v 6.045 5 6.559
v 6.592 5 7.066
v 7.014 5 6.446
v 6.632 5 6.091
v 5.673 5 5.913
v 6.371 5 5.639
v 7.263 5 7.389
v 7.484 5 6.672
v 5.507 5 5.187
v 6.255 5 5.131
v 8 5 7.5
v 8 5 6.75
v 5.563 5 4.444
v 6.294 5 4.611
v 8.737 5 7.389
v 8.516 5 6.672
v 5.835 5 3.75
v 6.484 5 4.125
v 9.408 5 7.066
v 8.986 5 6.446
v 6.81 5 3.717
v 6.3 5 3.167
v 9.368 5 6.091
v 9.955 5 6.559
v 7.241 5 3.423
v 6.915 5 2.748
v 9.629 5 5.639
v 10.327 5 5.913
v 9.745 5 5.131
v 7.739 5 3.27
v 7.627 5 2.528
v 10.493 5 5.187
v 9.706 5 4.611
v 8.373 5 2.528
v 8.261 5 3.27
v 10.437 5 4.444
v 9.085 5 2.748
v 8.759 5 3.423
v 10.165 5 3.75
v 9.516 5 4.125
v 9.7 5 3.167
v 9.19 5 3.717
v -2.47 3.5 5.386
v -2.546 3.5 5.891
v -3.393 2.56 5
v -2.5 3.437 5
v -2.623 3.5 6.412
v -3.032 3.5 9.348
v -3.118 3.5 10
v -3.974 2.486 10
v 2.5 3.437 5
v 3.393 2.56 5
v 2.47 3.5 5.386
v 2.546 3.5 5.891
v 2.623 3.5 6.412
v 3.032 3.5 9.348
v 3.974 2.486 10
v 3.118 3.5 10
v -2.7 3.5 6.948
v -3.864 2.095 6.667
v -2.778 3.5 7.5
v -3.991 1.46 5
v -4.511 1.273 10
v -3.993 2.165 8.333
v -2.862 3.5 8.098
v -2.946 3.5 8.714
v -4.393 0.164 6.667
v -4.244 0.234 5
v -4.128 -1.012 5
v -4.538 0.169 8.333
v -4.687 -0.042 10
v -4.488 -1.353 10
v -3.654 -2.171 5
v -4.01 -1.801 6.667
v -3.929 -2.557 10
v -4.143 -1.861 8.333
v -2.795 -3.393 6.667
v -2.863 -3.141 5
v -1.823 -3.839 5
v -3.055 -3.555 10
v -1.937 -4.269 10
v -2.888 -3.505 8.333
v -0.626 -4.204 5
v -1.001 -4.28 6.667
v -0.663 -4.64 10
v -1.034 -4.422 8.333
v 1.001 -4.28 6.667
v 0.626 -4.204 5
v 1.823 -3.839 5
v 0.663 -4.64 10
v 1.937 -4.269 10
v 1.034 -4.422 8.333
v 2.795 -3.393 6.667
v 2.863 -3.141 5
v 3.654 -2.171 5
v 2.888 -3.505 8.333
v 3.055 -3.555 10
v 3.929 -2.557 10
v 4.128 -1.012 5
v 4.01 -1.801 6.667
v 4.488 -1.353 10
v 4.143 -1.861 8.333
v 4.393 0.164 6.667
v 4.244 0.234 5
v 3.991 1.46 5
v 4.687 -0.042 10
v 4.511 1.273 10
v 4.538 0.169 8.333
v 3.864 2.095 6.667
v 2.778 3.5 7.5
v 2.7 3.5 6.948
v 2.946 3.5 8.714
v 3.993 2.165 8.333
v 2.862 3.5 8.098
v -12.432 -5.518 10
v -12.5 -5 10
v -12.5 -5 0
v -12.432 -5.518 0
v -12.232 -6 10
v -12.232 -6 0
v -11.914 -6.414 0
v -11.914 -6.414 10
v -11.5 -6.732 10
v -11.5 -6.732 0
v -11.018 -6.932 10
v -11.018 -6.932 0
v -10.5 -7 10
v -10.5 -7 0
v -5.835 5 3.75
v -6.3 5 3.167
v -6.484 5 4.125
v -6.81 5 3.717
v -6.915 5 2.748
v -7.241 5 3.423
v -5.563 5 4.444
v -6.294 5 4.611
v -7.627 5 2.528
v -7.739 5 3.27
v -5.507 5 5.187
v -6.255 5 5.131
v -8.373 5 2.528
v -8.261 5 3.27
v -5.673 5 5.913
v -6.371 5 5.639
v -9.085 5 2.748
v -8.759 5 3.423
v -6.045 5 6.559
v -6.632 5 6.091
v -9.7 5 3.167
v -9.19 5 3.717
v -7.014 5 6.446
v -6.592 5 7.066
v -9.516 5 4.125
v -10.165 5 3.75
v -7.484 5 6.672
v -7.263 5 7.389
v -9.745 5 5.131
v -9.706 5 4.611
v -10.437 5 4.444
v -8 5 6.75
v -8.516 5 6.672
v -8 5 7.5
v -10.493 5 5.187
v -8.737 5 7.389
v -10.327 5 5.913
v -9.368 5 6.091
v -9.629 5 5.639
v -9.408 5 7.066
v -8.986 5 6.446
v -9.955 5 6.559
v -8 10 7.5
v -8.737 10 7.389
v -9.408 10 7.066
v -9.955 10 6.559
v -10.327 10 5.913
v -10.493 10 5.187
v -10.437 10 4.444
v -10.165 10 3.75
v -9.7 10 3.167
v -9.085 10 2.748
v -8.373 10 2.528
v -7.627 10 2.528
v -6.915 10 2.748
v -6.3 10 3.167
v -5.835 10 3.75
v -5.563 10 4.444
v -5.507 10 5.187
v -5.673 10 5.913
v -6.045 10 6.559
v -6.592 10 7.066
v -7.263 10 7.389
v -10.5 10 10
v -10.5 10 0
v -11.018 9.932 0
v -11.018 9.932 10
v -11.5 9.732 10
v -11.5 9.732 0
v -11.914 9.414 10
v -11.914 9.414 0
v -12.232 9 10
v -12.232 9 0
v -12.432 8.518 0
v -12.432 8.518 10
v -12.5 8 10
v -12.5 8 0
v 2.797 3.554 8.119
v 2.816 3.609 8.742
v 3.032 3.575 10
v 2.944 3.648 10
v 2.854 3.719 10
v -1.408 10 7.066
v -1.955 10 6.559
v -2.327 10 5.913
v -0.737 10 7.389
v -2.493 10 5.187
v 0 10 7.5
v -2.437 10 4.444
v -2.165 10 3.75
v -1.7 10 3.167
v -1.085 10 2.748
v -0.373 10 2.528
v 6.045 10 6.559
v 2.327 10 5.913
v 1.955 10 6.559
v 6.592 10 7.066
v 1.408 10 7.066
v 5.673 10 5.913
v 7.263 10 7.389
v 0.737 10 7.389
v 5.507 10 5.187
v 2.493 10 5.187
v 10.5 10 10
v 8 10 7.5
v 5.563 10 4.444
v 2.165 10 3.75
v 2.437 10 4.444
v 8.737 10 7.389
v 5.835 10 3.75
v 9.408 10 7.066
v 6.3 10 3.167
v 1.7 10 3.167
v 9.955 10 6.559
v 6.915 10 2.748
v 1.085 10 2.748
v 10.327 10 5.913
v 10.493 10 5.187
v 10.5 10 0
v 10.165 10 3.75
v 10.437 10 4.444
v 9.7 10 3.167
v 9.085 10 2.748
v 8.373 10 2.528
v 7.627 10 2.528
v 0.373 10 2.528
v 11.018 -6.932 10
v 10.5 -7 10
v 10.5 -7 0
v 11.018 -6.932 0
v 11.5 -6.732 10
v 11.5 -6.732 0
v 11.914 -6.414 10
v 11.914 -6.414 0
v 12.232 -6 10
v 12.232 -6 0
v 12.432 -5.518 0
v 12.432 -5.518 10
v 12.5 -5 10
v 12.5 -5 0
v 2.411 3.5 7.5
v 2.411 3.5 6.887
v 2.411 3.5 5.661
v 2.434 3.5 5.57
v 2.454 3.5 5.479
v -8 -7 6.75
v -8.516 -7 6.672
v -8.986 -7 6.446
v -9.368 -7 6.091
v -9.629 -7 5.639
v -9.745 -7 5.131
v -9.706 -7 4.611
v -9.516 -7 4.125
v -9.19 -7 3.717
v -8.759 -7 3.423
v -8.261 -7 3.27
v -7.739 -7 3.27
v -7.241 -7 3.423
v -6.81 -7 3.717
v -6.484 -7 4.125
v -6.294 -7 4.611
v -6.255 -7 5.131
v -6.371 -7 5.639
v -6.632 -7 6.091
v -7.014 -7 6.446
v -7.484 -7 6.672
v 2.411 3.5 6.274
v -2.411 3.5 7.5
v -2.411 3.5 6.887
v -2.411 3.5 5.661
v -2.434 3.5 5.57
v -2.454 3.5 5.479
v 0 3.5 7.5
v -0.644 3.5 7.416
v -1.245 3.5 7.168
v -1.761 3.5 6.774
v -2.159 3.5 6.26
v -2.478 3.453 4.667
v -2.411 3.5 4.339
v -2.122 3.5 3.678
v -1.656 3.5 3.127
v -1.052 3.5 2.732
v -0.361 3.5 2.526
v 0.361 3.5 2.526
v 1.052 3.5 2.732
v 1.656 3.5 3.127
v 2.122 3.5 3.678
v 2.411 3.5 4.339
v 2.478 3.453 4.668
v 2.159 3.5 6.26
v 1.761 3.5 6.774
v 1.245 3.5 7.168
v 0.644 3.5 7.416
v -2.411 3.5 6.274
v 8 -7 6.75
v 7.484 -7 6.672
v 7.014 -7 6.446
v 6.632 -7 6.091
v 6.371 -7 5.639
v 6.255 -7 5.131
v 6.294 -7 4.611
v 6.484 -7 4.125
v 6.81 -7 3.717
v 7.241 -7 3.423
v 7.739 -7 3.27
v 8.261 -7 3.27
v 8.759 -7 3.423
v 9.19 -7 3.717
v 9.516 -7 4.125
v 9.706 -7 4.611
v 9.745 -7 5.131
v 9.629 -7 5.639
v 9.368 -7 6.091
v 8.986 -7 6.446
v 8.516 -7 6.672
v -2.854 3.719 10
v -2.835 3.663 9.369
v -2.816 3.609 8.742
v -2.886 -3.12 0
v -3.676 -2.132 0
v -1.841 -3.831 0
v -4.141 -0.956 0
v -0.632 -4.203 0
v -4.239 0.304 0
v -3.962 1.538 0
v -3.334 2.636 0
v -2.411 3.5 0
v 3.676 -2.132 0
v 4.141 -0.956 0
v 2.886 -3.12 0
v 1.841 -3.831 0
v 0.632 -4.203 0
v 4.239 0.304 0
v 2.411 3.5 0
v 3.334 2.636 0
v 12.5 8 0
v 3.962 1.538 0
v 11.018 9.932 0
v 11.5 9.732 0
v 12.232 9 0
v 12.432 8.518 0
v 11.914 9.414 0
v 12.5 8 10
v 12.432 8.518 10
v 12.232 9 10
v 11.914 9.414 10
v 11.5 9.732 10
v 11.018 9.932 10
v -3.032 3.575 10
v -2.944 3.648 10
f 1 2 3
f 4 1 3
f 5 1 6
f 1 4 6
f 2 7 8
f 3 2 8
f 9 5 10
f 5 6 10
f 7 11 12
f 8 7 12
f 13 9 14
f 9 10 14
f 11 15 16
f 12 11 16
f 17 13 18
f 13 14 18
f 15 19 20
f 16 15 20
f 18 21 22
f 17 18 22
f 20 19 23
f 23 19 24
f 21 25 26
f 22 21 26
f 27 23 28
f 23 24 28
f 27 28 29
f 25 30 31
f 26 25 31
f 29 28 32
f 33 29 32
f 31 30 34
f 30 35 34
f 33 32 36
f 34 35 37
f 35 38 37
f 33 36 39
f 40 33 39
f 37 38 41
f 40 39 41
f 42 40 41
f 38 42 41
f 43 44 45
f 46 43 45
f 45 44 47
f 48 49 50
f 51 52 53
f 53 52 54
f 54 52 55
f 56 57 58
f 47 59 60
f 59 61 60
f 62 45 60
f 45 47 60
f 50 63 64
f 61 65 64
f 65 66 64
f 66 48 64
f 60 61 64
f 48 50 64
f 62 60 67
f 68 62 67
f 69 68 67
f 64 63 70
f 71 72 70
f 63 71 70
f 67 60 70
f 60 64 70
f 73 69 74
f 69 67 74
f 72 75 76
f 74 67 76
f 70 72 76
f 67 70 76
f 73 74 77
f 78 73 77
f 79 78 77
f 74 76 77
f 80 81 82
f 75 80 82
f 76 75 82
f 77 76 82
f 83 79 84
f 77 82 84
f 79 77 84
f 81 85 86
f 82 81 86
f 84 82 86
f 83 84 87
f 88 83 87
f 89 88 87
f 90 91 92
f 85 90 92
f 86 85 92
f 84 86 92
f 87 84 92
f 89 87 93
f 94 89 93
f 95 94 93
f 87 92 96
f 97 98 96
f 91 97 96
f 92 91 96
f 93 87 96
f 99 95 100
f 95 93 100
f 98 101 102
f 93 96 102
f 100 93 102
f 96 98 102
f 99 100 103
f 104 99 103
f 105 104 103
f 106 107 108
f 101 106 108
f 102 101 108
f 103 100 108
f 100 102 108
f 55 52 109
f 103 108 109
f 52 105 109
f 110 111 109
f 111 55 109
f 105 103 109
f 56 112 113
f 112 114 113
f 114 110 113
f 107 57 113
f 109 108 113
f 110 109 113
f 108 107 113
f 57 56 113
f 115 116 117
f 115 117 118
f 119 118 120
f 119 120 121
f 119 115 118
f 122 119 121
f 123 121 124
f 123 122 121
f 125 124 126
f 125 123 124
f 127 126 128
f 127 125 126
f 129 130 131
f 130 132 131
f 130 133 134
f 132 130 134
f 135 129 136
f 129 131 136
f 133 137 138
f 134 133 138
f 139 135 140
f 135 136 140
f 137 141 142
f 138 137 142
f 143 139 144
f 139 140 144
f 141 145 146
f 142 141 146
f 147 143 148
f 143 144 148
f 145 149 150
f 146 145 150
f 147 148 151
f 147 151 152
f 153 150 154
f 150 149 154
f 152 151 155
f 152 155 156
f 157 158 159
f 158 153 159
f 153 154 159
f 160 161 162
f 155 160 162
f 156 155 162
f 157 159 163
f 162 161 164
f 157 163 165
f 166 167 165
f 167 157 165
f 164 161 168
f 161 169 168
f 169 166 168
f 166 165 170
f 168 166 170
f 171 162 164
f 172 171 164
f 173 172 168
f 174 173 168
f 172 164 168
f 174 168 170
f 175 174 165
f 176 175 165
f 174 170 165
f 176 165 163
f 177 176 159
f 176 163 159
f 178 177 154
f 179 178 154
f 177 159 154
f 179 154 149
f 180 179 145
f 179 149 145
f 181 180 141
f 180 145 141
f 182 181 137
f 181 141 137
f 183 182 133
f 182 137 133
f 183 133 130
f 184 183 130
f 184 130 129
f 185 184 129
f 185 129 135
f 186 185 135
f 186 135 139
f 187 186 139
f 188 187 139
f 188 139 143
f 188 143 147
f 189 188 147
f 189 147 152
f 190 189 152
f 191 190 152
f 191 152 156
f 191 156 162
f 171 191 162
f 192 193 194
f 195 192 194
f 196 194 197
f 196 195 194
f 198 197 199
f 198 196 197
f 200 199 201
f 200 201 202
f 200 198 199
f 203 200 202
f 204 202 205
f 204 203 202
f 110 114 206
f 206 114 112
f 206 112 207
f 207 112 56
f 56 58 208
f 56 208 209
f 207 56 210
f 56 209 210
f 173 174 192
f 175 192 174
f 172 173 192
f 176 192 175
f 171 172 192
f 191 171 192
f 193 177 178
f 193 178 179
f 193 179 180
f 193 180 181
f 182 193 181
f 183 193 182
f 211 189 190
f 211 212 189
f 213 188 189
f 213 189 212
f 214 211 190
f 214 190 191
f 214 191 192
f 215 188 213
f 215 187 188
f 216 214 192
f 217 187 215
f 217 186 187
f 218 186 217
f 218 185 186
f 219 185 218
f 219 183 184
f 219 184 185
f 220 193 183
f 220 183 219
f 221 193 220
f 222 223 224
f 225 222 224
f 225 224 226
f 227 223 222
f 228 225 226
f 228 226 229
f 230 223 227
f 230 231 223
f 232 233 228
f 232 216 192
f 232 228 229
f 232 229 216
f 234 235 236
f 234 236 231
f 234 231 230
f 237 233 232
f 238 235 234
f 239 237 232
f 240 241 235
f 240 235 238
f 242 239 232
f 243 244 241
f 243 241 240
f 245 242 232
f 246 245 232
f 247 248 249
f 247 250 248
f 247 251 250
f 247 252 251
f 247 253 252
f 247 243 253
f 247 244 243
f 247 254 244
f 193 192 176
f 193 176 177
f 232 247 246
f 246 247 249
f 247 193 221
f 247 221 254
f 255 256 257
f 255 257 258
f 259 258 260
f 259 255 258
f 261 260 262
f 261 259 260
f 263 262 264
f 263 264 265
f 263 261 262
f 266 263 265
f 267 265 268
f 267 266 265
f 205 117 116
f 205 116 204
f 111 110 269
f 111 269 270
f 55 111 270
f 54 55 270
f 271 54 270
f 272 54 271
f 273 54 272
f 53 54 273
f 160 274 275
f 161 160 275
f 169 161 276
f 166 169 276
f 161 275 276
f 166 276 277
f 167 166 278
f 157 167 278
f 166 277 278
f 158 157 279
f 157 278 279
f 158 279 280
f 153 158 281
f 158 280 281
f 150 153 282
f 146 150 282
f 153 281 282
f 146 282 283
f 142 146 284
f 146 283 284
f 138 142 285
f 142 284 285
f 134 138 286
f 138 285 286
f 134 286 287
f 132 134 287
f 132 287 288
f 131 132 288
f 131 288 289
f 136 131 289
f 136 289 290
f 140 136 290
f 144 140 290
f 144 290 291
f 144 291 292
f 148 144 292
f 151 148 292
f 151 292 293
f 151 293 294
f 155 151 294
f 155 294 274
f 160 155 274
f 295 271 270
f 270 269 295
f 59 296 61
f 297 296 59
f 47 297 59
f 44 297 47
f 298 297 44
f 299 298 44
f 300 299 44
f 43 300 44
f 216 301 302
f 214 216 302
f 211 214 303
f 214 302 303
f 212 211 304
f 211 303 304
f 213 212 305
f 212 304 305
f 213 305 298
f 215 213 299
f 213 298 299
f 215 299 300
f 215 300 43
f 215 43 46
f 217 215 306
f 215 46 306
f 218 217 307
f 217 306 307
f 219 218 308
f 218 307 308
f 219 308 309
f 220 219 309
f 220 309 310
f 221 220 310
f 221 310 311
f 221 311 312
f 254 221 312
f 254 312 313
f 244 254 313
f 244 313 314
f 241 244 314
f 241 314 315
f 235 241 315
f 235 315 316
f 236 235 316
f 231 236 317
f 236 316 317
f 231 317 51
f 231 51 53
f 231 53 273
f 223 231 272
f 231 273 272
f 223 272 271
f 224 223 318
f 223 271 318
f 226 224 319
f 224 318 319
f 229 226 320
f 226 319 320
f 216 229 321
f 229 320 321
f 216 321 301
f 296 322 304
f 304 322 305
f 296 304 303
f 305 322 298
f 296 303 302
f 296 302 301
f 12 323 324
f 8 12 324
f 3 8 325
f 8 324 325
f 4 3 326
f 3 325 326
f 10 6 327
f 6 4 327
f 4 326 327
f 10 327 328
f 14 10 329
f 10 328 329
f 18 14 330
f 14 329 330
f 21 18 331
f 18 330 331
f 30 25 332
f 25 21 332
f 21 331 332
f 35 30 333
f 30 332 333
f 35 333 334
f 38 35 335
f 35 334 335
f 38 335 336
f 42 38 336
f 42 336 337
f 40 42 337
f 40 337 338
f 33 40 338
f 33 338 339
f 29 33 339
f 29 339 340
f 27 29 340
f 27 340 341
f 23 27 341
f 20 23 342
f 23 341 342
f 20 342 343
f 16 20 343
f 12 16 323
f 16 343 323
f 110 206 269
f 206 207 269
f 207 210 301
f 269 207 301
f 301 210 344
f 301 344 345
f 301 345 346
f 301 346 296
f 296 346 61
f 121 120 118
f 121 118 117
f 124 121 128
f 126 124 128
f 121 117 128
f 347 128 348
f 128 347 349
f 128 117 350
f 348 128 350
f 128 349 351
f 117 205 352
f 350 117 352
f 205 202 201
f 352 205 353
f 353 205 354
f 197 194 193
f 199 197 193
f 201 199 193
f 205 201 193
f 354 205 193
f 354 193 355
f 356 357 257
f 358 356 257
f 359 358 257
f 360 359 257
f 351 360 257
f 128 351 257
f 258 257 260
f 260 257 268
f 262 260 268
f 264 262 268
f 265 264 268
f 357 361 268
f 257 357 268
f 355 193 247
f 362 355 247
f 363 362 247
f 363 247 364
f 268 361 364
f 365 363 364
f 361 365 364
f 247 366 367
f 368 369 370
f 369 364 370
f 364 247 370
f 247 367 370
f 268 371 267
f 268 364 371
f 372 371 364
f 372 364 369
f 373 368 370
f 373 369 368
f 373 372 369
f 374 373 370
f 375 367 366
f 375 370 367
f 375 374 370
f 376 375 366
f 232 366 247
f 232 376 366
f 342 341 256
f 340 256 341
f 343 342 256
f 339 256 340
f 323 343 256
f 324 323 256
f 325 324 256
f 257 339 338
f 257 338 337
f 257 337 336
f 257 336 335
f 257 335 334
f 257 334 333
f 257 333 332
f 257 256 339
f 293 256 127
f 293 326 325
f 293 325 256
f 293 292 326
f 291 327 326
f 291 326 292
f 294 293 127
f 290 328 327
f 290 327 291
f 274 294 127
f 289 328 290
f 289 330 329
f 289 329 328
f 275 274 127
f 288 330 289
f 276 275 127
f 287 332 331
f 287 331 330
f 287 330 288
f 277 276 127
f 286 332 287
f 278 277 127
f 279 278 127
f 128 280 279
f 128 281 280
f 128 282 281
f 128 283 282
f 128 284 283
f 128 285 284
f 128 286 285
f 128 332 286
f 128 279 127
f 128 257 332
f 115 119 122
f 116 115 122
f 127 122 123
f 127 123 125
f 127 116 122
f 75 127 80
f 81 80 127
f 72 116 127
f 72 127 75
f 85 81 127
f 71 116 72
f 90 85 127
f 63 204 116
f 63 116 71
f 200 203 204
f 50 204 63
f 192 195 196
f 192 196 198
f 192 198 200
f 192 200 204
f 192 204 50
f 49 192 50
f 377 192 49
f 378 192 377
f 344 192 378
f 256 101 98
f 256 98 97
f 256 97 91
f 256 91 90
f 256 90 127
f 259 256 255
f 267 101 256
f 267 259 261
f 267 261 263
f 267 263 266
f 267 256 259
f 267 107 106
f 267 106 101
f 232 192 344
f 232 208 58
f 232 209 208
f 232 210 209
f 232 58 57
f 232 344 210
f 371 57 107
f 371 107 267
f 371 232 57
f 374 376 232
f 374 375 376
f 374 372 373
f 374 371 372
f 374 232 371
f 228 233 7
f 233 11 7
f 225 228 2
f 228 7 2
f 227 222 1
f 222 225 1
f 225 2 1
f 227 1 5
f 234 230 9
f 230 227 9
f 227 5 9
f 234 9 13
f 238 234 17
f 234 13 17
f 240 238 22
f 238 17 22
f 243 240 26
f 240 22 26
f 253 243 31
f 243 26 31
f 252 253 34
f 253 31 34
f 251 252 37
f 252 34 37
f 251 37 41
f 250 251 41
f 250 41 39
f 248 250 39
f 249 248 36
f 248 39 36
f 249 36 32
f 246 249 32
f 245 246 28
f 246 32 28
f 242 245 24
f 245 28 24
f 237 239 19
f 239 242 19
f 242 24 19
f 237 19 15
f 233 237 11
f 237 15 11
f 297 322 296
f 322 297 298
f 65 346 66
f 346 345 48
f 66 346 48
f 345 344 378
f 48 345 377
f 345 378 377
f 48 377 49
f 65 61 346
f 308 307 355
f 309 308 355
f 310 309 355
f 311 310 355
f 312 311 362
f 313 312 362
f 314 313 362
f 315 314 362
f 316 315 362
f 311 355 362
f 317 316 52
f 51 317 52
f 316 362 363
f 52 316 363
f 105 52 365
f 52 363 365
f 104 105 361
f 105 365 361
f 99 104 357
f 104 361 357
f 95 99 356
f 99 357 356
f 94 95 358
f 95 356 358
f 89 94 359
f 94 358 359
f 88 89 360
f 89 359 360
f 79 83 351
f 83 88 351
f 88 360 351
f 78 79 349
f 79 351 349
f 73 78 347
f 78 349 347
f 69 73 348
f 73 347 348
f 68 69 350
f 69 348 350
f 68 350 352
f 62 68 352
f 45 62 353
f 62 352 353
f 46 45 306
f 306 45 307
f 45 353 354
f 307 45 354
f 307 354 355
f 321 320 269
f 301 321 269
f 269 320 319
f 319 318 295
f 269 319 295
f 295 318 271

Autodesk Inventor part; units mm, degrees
ref_plane "YZ Plane" through (0, 0, 0) normal (1, 0, 0) x (0, 1, 0)
ref_plane "XZ Plane" through (0, 0, 0) normal (0, 1, 0) x (-1, 0, 0)
ref_plane "XY Plane" through (0, 0, 0) normal (0, 0, 1) x (1, 0, 0)
sketch "Sketch1" plane through (0, 0, 0) normal (0, 0, 1) x (1, 0, 0)
  circle A0 centre (0, 0) radius 4.25
  line L0 (-2.4109, 3.5) -> (2.4109, 3.5)
  line L1 (-12.5, 10) -> (12.5, 10)
  line L2 (12.5, 10) -> (12.5, -7)
  line L3 (12.5, -7) -> (-12.5, -7)
  line L4 (-12.5, -7) -> (-12.5, 10)
  dimension "d0" = 8.5
  dimension "d1" = 3.5
  dimension "d2" = 25
  dimension "d3" = 12.5
  dimension "d4" = 17
  dimension "d5" = 10
extrude "Extrusion1" add sketch "Sketch1" along normal blind 10 contours L0 A0 | L1 L2 L3 L4 picked at (-0.1705, 3.7397)
sketch "Sketch2" plane through (-12.5, 10, 0) normal (0, 1, 0) x (1, 0, 0)
  line L0 (25, -10) -> (0, -10) projected
  line L1 (25, 0) -> (0, 0) projected
  line L2 (0, 0) -> (0, -10) projected
  point P0 (12.5, 0)
  point P1 (4.5, -5)
  dimension "d8" = 10
  dimension "d9" = 5
  dimension "d18" = 8
hole "Hole1" at (-8, 10, 5) direction (0, -1, 0) diameter 3.5 depth 17 counterbore diameter 5 counterbore depth 5
mirror "Mirror1" about plane through (0, 0, 0) normal (1, 0, 0) of "Hole1"
sketch "Sketch3" plane through (-12.5, 10, 0) normal (0, 1, 0) x (1, 0, 0)
  line L0 (25, -10) -> (0, -10) projected
  line L1 (25, 0) -> (0, 0) projected
  line L2 (25, 0) -> (25, -10) projected
  line L3 (0, 0) -> (0, -10) projected
  point P0 (12.5, 0)
  point P1 (12.5, -5)
  dimension "d19" = 10
  dimension "d20" = 5
  dimension "d21" = 25
  dimension "d22" = 12.5
hole "Hole2" at (0, 10, 5) direction (0, -1, 0) diameter 5 end up to surface
fillet "Fillet1" radius 2 4 edges at (-12.5, 10, 5) (12.5, 10, 5) (12.5, -7, 5) (-12.5, -7, 5)
chamfer "Chamfer1" distance 5 angle 5 1 edges at (0, -4.25, 10)
chamfer "Chamfer2" distance 2.5 angle 5 1 edges at (0, 3.5, 10) measured on face at (0, 3.5, 9.1667)
equation "\"d3\" = 0.5 * d2"
equation "\"d9\" = 0.5 * d8"
equation "\"d20\" = 0.5 * d19"
equation "\"d22\" = 0.5 * d21"
properties part number "pendulum_adapter" material "ABS Plastic"
